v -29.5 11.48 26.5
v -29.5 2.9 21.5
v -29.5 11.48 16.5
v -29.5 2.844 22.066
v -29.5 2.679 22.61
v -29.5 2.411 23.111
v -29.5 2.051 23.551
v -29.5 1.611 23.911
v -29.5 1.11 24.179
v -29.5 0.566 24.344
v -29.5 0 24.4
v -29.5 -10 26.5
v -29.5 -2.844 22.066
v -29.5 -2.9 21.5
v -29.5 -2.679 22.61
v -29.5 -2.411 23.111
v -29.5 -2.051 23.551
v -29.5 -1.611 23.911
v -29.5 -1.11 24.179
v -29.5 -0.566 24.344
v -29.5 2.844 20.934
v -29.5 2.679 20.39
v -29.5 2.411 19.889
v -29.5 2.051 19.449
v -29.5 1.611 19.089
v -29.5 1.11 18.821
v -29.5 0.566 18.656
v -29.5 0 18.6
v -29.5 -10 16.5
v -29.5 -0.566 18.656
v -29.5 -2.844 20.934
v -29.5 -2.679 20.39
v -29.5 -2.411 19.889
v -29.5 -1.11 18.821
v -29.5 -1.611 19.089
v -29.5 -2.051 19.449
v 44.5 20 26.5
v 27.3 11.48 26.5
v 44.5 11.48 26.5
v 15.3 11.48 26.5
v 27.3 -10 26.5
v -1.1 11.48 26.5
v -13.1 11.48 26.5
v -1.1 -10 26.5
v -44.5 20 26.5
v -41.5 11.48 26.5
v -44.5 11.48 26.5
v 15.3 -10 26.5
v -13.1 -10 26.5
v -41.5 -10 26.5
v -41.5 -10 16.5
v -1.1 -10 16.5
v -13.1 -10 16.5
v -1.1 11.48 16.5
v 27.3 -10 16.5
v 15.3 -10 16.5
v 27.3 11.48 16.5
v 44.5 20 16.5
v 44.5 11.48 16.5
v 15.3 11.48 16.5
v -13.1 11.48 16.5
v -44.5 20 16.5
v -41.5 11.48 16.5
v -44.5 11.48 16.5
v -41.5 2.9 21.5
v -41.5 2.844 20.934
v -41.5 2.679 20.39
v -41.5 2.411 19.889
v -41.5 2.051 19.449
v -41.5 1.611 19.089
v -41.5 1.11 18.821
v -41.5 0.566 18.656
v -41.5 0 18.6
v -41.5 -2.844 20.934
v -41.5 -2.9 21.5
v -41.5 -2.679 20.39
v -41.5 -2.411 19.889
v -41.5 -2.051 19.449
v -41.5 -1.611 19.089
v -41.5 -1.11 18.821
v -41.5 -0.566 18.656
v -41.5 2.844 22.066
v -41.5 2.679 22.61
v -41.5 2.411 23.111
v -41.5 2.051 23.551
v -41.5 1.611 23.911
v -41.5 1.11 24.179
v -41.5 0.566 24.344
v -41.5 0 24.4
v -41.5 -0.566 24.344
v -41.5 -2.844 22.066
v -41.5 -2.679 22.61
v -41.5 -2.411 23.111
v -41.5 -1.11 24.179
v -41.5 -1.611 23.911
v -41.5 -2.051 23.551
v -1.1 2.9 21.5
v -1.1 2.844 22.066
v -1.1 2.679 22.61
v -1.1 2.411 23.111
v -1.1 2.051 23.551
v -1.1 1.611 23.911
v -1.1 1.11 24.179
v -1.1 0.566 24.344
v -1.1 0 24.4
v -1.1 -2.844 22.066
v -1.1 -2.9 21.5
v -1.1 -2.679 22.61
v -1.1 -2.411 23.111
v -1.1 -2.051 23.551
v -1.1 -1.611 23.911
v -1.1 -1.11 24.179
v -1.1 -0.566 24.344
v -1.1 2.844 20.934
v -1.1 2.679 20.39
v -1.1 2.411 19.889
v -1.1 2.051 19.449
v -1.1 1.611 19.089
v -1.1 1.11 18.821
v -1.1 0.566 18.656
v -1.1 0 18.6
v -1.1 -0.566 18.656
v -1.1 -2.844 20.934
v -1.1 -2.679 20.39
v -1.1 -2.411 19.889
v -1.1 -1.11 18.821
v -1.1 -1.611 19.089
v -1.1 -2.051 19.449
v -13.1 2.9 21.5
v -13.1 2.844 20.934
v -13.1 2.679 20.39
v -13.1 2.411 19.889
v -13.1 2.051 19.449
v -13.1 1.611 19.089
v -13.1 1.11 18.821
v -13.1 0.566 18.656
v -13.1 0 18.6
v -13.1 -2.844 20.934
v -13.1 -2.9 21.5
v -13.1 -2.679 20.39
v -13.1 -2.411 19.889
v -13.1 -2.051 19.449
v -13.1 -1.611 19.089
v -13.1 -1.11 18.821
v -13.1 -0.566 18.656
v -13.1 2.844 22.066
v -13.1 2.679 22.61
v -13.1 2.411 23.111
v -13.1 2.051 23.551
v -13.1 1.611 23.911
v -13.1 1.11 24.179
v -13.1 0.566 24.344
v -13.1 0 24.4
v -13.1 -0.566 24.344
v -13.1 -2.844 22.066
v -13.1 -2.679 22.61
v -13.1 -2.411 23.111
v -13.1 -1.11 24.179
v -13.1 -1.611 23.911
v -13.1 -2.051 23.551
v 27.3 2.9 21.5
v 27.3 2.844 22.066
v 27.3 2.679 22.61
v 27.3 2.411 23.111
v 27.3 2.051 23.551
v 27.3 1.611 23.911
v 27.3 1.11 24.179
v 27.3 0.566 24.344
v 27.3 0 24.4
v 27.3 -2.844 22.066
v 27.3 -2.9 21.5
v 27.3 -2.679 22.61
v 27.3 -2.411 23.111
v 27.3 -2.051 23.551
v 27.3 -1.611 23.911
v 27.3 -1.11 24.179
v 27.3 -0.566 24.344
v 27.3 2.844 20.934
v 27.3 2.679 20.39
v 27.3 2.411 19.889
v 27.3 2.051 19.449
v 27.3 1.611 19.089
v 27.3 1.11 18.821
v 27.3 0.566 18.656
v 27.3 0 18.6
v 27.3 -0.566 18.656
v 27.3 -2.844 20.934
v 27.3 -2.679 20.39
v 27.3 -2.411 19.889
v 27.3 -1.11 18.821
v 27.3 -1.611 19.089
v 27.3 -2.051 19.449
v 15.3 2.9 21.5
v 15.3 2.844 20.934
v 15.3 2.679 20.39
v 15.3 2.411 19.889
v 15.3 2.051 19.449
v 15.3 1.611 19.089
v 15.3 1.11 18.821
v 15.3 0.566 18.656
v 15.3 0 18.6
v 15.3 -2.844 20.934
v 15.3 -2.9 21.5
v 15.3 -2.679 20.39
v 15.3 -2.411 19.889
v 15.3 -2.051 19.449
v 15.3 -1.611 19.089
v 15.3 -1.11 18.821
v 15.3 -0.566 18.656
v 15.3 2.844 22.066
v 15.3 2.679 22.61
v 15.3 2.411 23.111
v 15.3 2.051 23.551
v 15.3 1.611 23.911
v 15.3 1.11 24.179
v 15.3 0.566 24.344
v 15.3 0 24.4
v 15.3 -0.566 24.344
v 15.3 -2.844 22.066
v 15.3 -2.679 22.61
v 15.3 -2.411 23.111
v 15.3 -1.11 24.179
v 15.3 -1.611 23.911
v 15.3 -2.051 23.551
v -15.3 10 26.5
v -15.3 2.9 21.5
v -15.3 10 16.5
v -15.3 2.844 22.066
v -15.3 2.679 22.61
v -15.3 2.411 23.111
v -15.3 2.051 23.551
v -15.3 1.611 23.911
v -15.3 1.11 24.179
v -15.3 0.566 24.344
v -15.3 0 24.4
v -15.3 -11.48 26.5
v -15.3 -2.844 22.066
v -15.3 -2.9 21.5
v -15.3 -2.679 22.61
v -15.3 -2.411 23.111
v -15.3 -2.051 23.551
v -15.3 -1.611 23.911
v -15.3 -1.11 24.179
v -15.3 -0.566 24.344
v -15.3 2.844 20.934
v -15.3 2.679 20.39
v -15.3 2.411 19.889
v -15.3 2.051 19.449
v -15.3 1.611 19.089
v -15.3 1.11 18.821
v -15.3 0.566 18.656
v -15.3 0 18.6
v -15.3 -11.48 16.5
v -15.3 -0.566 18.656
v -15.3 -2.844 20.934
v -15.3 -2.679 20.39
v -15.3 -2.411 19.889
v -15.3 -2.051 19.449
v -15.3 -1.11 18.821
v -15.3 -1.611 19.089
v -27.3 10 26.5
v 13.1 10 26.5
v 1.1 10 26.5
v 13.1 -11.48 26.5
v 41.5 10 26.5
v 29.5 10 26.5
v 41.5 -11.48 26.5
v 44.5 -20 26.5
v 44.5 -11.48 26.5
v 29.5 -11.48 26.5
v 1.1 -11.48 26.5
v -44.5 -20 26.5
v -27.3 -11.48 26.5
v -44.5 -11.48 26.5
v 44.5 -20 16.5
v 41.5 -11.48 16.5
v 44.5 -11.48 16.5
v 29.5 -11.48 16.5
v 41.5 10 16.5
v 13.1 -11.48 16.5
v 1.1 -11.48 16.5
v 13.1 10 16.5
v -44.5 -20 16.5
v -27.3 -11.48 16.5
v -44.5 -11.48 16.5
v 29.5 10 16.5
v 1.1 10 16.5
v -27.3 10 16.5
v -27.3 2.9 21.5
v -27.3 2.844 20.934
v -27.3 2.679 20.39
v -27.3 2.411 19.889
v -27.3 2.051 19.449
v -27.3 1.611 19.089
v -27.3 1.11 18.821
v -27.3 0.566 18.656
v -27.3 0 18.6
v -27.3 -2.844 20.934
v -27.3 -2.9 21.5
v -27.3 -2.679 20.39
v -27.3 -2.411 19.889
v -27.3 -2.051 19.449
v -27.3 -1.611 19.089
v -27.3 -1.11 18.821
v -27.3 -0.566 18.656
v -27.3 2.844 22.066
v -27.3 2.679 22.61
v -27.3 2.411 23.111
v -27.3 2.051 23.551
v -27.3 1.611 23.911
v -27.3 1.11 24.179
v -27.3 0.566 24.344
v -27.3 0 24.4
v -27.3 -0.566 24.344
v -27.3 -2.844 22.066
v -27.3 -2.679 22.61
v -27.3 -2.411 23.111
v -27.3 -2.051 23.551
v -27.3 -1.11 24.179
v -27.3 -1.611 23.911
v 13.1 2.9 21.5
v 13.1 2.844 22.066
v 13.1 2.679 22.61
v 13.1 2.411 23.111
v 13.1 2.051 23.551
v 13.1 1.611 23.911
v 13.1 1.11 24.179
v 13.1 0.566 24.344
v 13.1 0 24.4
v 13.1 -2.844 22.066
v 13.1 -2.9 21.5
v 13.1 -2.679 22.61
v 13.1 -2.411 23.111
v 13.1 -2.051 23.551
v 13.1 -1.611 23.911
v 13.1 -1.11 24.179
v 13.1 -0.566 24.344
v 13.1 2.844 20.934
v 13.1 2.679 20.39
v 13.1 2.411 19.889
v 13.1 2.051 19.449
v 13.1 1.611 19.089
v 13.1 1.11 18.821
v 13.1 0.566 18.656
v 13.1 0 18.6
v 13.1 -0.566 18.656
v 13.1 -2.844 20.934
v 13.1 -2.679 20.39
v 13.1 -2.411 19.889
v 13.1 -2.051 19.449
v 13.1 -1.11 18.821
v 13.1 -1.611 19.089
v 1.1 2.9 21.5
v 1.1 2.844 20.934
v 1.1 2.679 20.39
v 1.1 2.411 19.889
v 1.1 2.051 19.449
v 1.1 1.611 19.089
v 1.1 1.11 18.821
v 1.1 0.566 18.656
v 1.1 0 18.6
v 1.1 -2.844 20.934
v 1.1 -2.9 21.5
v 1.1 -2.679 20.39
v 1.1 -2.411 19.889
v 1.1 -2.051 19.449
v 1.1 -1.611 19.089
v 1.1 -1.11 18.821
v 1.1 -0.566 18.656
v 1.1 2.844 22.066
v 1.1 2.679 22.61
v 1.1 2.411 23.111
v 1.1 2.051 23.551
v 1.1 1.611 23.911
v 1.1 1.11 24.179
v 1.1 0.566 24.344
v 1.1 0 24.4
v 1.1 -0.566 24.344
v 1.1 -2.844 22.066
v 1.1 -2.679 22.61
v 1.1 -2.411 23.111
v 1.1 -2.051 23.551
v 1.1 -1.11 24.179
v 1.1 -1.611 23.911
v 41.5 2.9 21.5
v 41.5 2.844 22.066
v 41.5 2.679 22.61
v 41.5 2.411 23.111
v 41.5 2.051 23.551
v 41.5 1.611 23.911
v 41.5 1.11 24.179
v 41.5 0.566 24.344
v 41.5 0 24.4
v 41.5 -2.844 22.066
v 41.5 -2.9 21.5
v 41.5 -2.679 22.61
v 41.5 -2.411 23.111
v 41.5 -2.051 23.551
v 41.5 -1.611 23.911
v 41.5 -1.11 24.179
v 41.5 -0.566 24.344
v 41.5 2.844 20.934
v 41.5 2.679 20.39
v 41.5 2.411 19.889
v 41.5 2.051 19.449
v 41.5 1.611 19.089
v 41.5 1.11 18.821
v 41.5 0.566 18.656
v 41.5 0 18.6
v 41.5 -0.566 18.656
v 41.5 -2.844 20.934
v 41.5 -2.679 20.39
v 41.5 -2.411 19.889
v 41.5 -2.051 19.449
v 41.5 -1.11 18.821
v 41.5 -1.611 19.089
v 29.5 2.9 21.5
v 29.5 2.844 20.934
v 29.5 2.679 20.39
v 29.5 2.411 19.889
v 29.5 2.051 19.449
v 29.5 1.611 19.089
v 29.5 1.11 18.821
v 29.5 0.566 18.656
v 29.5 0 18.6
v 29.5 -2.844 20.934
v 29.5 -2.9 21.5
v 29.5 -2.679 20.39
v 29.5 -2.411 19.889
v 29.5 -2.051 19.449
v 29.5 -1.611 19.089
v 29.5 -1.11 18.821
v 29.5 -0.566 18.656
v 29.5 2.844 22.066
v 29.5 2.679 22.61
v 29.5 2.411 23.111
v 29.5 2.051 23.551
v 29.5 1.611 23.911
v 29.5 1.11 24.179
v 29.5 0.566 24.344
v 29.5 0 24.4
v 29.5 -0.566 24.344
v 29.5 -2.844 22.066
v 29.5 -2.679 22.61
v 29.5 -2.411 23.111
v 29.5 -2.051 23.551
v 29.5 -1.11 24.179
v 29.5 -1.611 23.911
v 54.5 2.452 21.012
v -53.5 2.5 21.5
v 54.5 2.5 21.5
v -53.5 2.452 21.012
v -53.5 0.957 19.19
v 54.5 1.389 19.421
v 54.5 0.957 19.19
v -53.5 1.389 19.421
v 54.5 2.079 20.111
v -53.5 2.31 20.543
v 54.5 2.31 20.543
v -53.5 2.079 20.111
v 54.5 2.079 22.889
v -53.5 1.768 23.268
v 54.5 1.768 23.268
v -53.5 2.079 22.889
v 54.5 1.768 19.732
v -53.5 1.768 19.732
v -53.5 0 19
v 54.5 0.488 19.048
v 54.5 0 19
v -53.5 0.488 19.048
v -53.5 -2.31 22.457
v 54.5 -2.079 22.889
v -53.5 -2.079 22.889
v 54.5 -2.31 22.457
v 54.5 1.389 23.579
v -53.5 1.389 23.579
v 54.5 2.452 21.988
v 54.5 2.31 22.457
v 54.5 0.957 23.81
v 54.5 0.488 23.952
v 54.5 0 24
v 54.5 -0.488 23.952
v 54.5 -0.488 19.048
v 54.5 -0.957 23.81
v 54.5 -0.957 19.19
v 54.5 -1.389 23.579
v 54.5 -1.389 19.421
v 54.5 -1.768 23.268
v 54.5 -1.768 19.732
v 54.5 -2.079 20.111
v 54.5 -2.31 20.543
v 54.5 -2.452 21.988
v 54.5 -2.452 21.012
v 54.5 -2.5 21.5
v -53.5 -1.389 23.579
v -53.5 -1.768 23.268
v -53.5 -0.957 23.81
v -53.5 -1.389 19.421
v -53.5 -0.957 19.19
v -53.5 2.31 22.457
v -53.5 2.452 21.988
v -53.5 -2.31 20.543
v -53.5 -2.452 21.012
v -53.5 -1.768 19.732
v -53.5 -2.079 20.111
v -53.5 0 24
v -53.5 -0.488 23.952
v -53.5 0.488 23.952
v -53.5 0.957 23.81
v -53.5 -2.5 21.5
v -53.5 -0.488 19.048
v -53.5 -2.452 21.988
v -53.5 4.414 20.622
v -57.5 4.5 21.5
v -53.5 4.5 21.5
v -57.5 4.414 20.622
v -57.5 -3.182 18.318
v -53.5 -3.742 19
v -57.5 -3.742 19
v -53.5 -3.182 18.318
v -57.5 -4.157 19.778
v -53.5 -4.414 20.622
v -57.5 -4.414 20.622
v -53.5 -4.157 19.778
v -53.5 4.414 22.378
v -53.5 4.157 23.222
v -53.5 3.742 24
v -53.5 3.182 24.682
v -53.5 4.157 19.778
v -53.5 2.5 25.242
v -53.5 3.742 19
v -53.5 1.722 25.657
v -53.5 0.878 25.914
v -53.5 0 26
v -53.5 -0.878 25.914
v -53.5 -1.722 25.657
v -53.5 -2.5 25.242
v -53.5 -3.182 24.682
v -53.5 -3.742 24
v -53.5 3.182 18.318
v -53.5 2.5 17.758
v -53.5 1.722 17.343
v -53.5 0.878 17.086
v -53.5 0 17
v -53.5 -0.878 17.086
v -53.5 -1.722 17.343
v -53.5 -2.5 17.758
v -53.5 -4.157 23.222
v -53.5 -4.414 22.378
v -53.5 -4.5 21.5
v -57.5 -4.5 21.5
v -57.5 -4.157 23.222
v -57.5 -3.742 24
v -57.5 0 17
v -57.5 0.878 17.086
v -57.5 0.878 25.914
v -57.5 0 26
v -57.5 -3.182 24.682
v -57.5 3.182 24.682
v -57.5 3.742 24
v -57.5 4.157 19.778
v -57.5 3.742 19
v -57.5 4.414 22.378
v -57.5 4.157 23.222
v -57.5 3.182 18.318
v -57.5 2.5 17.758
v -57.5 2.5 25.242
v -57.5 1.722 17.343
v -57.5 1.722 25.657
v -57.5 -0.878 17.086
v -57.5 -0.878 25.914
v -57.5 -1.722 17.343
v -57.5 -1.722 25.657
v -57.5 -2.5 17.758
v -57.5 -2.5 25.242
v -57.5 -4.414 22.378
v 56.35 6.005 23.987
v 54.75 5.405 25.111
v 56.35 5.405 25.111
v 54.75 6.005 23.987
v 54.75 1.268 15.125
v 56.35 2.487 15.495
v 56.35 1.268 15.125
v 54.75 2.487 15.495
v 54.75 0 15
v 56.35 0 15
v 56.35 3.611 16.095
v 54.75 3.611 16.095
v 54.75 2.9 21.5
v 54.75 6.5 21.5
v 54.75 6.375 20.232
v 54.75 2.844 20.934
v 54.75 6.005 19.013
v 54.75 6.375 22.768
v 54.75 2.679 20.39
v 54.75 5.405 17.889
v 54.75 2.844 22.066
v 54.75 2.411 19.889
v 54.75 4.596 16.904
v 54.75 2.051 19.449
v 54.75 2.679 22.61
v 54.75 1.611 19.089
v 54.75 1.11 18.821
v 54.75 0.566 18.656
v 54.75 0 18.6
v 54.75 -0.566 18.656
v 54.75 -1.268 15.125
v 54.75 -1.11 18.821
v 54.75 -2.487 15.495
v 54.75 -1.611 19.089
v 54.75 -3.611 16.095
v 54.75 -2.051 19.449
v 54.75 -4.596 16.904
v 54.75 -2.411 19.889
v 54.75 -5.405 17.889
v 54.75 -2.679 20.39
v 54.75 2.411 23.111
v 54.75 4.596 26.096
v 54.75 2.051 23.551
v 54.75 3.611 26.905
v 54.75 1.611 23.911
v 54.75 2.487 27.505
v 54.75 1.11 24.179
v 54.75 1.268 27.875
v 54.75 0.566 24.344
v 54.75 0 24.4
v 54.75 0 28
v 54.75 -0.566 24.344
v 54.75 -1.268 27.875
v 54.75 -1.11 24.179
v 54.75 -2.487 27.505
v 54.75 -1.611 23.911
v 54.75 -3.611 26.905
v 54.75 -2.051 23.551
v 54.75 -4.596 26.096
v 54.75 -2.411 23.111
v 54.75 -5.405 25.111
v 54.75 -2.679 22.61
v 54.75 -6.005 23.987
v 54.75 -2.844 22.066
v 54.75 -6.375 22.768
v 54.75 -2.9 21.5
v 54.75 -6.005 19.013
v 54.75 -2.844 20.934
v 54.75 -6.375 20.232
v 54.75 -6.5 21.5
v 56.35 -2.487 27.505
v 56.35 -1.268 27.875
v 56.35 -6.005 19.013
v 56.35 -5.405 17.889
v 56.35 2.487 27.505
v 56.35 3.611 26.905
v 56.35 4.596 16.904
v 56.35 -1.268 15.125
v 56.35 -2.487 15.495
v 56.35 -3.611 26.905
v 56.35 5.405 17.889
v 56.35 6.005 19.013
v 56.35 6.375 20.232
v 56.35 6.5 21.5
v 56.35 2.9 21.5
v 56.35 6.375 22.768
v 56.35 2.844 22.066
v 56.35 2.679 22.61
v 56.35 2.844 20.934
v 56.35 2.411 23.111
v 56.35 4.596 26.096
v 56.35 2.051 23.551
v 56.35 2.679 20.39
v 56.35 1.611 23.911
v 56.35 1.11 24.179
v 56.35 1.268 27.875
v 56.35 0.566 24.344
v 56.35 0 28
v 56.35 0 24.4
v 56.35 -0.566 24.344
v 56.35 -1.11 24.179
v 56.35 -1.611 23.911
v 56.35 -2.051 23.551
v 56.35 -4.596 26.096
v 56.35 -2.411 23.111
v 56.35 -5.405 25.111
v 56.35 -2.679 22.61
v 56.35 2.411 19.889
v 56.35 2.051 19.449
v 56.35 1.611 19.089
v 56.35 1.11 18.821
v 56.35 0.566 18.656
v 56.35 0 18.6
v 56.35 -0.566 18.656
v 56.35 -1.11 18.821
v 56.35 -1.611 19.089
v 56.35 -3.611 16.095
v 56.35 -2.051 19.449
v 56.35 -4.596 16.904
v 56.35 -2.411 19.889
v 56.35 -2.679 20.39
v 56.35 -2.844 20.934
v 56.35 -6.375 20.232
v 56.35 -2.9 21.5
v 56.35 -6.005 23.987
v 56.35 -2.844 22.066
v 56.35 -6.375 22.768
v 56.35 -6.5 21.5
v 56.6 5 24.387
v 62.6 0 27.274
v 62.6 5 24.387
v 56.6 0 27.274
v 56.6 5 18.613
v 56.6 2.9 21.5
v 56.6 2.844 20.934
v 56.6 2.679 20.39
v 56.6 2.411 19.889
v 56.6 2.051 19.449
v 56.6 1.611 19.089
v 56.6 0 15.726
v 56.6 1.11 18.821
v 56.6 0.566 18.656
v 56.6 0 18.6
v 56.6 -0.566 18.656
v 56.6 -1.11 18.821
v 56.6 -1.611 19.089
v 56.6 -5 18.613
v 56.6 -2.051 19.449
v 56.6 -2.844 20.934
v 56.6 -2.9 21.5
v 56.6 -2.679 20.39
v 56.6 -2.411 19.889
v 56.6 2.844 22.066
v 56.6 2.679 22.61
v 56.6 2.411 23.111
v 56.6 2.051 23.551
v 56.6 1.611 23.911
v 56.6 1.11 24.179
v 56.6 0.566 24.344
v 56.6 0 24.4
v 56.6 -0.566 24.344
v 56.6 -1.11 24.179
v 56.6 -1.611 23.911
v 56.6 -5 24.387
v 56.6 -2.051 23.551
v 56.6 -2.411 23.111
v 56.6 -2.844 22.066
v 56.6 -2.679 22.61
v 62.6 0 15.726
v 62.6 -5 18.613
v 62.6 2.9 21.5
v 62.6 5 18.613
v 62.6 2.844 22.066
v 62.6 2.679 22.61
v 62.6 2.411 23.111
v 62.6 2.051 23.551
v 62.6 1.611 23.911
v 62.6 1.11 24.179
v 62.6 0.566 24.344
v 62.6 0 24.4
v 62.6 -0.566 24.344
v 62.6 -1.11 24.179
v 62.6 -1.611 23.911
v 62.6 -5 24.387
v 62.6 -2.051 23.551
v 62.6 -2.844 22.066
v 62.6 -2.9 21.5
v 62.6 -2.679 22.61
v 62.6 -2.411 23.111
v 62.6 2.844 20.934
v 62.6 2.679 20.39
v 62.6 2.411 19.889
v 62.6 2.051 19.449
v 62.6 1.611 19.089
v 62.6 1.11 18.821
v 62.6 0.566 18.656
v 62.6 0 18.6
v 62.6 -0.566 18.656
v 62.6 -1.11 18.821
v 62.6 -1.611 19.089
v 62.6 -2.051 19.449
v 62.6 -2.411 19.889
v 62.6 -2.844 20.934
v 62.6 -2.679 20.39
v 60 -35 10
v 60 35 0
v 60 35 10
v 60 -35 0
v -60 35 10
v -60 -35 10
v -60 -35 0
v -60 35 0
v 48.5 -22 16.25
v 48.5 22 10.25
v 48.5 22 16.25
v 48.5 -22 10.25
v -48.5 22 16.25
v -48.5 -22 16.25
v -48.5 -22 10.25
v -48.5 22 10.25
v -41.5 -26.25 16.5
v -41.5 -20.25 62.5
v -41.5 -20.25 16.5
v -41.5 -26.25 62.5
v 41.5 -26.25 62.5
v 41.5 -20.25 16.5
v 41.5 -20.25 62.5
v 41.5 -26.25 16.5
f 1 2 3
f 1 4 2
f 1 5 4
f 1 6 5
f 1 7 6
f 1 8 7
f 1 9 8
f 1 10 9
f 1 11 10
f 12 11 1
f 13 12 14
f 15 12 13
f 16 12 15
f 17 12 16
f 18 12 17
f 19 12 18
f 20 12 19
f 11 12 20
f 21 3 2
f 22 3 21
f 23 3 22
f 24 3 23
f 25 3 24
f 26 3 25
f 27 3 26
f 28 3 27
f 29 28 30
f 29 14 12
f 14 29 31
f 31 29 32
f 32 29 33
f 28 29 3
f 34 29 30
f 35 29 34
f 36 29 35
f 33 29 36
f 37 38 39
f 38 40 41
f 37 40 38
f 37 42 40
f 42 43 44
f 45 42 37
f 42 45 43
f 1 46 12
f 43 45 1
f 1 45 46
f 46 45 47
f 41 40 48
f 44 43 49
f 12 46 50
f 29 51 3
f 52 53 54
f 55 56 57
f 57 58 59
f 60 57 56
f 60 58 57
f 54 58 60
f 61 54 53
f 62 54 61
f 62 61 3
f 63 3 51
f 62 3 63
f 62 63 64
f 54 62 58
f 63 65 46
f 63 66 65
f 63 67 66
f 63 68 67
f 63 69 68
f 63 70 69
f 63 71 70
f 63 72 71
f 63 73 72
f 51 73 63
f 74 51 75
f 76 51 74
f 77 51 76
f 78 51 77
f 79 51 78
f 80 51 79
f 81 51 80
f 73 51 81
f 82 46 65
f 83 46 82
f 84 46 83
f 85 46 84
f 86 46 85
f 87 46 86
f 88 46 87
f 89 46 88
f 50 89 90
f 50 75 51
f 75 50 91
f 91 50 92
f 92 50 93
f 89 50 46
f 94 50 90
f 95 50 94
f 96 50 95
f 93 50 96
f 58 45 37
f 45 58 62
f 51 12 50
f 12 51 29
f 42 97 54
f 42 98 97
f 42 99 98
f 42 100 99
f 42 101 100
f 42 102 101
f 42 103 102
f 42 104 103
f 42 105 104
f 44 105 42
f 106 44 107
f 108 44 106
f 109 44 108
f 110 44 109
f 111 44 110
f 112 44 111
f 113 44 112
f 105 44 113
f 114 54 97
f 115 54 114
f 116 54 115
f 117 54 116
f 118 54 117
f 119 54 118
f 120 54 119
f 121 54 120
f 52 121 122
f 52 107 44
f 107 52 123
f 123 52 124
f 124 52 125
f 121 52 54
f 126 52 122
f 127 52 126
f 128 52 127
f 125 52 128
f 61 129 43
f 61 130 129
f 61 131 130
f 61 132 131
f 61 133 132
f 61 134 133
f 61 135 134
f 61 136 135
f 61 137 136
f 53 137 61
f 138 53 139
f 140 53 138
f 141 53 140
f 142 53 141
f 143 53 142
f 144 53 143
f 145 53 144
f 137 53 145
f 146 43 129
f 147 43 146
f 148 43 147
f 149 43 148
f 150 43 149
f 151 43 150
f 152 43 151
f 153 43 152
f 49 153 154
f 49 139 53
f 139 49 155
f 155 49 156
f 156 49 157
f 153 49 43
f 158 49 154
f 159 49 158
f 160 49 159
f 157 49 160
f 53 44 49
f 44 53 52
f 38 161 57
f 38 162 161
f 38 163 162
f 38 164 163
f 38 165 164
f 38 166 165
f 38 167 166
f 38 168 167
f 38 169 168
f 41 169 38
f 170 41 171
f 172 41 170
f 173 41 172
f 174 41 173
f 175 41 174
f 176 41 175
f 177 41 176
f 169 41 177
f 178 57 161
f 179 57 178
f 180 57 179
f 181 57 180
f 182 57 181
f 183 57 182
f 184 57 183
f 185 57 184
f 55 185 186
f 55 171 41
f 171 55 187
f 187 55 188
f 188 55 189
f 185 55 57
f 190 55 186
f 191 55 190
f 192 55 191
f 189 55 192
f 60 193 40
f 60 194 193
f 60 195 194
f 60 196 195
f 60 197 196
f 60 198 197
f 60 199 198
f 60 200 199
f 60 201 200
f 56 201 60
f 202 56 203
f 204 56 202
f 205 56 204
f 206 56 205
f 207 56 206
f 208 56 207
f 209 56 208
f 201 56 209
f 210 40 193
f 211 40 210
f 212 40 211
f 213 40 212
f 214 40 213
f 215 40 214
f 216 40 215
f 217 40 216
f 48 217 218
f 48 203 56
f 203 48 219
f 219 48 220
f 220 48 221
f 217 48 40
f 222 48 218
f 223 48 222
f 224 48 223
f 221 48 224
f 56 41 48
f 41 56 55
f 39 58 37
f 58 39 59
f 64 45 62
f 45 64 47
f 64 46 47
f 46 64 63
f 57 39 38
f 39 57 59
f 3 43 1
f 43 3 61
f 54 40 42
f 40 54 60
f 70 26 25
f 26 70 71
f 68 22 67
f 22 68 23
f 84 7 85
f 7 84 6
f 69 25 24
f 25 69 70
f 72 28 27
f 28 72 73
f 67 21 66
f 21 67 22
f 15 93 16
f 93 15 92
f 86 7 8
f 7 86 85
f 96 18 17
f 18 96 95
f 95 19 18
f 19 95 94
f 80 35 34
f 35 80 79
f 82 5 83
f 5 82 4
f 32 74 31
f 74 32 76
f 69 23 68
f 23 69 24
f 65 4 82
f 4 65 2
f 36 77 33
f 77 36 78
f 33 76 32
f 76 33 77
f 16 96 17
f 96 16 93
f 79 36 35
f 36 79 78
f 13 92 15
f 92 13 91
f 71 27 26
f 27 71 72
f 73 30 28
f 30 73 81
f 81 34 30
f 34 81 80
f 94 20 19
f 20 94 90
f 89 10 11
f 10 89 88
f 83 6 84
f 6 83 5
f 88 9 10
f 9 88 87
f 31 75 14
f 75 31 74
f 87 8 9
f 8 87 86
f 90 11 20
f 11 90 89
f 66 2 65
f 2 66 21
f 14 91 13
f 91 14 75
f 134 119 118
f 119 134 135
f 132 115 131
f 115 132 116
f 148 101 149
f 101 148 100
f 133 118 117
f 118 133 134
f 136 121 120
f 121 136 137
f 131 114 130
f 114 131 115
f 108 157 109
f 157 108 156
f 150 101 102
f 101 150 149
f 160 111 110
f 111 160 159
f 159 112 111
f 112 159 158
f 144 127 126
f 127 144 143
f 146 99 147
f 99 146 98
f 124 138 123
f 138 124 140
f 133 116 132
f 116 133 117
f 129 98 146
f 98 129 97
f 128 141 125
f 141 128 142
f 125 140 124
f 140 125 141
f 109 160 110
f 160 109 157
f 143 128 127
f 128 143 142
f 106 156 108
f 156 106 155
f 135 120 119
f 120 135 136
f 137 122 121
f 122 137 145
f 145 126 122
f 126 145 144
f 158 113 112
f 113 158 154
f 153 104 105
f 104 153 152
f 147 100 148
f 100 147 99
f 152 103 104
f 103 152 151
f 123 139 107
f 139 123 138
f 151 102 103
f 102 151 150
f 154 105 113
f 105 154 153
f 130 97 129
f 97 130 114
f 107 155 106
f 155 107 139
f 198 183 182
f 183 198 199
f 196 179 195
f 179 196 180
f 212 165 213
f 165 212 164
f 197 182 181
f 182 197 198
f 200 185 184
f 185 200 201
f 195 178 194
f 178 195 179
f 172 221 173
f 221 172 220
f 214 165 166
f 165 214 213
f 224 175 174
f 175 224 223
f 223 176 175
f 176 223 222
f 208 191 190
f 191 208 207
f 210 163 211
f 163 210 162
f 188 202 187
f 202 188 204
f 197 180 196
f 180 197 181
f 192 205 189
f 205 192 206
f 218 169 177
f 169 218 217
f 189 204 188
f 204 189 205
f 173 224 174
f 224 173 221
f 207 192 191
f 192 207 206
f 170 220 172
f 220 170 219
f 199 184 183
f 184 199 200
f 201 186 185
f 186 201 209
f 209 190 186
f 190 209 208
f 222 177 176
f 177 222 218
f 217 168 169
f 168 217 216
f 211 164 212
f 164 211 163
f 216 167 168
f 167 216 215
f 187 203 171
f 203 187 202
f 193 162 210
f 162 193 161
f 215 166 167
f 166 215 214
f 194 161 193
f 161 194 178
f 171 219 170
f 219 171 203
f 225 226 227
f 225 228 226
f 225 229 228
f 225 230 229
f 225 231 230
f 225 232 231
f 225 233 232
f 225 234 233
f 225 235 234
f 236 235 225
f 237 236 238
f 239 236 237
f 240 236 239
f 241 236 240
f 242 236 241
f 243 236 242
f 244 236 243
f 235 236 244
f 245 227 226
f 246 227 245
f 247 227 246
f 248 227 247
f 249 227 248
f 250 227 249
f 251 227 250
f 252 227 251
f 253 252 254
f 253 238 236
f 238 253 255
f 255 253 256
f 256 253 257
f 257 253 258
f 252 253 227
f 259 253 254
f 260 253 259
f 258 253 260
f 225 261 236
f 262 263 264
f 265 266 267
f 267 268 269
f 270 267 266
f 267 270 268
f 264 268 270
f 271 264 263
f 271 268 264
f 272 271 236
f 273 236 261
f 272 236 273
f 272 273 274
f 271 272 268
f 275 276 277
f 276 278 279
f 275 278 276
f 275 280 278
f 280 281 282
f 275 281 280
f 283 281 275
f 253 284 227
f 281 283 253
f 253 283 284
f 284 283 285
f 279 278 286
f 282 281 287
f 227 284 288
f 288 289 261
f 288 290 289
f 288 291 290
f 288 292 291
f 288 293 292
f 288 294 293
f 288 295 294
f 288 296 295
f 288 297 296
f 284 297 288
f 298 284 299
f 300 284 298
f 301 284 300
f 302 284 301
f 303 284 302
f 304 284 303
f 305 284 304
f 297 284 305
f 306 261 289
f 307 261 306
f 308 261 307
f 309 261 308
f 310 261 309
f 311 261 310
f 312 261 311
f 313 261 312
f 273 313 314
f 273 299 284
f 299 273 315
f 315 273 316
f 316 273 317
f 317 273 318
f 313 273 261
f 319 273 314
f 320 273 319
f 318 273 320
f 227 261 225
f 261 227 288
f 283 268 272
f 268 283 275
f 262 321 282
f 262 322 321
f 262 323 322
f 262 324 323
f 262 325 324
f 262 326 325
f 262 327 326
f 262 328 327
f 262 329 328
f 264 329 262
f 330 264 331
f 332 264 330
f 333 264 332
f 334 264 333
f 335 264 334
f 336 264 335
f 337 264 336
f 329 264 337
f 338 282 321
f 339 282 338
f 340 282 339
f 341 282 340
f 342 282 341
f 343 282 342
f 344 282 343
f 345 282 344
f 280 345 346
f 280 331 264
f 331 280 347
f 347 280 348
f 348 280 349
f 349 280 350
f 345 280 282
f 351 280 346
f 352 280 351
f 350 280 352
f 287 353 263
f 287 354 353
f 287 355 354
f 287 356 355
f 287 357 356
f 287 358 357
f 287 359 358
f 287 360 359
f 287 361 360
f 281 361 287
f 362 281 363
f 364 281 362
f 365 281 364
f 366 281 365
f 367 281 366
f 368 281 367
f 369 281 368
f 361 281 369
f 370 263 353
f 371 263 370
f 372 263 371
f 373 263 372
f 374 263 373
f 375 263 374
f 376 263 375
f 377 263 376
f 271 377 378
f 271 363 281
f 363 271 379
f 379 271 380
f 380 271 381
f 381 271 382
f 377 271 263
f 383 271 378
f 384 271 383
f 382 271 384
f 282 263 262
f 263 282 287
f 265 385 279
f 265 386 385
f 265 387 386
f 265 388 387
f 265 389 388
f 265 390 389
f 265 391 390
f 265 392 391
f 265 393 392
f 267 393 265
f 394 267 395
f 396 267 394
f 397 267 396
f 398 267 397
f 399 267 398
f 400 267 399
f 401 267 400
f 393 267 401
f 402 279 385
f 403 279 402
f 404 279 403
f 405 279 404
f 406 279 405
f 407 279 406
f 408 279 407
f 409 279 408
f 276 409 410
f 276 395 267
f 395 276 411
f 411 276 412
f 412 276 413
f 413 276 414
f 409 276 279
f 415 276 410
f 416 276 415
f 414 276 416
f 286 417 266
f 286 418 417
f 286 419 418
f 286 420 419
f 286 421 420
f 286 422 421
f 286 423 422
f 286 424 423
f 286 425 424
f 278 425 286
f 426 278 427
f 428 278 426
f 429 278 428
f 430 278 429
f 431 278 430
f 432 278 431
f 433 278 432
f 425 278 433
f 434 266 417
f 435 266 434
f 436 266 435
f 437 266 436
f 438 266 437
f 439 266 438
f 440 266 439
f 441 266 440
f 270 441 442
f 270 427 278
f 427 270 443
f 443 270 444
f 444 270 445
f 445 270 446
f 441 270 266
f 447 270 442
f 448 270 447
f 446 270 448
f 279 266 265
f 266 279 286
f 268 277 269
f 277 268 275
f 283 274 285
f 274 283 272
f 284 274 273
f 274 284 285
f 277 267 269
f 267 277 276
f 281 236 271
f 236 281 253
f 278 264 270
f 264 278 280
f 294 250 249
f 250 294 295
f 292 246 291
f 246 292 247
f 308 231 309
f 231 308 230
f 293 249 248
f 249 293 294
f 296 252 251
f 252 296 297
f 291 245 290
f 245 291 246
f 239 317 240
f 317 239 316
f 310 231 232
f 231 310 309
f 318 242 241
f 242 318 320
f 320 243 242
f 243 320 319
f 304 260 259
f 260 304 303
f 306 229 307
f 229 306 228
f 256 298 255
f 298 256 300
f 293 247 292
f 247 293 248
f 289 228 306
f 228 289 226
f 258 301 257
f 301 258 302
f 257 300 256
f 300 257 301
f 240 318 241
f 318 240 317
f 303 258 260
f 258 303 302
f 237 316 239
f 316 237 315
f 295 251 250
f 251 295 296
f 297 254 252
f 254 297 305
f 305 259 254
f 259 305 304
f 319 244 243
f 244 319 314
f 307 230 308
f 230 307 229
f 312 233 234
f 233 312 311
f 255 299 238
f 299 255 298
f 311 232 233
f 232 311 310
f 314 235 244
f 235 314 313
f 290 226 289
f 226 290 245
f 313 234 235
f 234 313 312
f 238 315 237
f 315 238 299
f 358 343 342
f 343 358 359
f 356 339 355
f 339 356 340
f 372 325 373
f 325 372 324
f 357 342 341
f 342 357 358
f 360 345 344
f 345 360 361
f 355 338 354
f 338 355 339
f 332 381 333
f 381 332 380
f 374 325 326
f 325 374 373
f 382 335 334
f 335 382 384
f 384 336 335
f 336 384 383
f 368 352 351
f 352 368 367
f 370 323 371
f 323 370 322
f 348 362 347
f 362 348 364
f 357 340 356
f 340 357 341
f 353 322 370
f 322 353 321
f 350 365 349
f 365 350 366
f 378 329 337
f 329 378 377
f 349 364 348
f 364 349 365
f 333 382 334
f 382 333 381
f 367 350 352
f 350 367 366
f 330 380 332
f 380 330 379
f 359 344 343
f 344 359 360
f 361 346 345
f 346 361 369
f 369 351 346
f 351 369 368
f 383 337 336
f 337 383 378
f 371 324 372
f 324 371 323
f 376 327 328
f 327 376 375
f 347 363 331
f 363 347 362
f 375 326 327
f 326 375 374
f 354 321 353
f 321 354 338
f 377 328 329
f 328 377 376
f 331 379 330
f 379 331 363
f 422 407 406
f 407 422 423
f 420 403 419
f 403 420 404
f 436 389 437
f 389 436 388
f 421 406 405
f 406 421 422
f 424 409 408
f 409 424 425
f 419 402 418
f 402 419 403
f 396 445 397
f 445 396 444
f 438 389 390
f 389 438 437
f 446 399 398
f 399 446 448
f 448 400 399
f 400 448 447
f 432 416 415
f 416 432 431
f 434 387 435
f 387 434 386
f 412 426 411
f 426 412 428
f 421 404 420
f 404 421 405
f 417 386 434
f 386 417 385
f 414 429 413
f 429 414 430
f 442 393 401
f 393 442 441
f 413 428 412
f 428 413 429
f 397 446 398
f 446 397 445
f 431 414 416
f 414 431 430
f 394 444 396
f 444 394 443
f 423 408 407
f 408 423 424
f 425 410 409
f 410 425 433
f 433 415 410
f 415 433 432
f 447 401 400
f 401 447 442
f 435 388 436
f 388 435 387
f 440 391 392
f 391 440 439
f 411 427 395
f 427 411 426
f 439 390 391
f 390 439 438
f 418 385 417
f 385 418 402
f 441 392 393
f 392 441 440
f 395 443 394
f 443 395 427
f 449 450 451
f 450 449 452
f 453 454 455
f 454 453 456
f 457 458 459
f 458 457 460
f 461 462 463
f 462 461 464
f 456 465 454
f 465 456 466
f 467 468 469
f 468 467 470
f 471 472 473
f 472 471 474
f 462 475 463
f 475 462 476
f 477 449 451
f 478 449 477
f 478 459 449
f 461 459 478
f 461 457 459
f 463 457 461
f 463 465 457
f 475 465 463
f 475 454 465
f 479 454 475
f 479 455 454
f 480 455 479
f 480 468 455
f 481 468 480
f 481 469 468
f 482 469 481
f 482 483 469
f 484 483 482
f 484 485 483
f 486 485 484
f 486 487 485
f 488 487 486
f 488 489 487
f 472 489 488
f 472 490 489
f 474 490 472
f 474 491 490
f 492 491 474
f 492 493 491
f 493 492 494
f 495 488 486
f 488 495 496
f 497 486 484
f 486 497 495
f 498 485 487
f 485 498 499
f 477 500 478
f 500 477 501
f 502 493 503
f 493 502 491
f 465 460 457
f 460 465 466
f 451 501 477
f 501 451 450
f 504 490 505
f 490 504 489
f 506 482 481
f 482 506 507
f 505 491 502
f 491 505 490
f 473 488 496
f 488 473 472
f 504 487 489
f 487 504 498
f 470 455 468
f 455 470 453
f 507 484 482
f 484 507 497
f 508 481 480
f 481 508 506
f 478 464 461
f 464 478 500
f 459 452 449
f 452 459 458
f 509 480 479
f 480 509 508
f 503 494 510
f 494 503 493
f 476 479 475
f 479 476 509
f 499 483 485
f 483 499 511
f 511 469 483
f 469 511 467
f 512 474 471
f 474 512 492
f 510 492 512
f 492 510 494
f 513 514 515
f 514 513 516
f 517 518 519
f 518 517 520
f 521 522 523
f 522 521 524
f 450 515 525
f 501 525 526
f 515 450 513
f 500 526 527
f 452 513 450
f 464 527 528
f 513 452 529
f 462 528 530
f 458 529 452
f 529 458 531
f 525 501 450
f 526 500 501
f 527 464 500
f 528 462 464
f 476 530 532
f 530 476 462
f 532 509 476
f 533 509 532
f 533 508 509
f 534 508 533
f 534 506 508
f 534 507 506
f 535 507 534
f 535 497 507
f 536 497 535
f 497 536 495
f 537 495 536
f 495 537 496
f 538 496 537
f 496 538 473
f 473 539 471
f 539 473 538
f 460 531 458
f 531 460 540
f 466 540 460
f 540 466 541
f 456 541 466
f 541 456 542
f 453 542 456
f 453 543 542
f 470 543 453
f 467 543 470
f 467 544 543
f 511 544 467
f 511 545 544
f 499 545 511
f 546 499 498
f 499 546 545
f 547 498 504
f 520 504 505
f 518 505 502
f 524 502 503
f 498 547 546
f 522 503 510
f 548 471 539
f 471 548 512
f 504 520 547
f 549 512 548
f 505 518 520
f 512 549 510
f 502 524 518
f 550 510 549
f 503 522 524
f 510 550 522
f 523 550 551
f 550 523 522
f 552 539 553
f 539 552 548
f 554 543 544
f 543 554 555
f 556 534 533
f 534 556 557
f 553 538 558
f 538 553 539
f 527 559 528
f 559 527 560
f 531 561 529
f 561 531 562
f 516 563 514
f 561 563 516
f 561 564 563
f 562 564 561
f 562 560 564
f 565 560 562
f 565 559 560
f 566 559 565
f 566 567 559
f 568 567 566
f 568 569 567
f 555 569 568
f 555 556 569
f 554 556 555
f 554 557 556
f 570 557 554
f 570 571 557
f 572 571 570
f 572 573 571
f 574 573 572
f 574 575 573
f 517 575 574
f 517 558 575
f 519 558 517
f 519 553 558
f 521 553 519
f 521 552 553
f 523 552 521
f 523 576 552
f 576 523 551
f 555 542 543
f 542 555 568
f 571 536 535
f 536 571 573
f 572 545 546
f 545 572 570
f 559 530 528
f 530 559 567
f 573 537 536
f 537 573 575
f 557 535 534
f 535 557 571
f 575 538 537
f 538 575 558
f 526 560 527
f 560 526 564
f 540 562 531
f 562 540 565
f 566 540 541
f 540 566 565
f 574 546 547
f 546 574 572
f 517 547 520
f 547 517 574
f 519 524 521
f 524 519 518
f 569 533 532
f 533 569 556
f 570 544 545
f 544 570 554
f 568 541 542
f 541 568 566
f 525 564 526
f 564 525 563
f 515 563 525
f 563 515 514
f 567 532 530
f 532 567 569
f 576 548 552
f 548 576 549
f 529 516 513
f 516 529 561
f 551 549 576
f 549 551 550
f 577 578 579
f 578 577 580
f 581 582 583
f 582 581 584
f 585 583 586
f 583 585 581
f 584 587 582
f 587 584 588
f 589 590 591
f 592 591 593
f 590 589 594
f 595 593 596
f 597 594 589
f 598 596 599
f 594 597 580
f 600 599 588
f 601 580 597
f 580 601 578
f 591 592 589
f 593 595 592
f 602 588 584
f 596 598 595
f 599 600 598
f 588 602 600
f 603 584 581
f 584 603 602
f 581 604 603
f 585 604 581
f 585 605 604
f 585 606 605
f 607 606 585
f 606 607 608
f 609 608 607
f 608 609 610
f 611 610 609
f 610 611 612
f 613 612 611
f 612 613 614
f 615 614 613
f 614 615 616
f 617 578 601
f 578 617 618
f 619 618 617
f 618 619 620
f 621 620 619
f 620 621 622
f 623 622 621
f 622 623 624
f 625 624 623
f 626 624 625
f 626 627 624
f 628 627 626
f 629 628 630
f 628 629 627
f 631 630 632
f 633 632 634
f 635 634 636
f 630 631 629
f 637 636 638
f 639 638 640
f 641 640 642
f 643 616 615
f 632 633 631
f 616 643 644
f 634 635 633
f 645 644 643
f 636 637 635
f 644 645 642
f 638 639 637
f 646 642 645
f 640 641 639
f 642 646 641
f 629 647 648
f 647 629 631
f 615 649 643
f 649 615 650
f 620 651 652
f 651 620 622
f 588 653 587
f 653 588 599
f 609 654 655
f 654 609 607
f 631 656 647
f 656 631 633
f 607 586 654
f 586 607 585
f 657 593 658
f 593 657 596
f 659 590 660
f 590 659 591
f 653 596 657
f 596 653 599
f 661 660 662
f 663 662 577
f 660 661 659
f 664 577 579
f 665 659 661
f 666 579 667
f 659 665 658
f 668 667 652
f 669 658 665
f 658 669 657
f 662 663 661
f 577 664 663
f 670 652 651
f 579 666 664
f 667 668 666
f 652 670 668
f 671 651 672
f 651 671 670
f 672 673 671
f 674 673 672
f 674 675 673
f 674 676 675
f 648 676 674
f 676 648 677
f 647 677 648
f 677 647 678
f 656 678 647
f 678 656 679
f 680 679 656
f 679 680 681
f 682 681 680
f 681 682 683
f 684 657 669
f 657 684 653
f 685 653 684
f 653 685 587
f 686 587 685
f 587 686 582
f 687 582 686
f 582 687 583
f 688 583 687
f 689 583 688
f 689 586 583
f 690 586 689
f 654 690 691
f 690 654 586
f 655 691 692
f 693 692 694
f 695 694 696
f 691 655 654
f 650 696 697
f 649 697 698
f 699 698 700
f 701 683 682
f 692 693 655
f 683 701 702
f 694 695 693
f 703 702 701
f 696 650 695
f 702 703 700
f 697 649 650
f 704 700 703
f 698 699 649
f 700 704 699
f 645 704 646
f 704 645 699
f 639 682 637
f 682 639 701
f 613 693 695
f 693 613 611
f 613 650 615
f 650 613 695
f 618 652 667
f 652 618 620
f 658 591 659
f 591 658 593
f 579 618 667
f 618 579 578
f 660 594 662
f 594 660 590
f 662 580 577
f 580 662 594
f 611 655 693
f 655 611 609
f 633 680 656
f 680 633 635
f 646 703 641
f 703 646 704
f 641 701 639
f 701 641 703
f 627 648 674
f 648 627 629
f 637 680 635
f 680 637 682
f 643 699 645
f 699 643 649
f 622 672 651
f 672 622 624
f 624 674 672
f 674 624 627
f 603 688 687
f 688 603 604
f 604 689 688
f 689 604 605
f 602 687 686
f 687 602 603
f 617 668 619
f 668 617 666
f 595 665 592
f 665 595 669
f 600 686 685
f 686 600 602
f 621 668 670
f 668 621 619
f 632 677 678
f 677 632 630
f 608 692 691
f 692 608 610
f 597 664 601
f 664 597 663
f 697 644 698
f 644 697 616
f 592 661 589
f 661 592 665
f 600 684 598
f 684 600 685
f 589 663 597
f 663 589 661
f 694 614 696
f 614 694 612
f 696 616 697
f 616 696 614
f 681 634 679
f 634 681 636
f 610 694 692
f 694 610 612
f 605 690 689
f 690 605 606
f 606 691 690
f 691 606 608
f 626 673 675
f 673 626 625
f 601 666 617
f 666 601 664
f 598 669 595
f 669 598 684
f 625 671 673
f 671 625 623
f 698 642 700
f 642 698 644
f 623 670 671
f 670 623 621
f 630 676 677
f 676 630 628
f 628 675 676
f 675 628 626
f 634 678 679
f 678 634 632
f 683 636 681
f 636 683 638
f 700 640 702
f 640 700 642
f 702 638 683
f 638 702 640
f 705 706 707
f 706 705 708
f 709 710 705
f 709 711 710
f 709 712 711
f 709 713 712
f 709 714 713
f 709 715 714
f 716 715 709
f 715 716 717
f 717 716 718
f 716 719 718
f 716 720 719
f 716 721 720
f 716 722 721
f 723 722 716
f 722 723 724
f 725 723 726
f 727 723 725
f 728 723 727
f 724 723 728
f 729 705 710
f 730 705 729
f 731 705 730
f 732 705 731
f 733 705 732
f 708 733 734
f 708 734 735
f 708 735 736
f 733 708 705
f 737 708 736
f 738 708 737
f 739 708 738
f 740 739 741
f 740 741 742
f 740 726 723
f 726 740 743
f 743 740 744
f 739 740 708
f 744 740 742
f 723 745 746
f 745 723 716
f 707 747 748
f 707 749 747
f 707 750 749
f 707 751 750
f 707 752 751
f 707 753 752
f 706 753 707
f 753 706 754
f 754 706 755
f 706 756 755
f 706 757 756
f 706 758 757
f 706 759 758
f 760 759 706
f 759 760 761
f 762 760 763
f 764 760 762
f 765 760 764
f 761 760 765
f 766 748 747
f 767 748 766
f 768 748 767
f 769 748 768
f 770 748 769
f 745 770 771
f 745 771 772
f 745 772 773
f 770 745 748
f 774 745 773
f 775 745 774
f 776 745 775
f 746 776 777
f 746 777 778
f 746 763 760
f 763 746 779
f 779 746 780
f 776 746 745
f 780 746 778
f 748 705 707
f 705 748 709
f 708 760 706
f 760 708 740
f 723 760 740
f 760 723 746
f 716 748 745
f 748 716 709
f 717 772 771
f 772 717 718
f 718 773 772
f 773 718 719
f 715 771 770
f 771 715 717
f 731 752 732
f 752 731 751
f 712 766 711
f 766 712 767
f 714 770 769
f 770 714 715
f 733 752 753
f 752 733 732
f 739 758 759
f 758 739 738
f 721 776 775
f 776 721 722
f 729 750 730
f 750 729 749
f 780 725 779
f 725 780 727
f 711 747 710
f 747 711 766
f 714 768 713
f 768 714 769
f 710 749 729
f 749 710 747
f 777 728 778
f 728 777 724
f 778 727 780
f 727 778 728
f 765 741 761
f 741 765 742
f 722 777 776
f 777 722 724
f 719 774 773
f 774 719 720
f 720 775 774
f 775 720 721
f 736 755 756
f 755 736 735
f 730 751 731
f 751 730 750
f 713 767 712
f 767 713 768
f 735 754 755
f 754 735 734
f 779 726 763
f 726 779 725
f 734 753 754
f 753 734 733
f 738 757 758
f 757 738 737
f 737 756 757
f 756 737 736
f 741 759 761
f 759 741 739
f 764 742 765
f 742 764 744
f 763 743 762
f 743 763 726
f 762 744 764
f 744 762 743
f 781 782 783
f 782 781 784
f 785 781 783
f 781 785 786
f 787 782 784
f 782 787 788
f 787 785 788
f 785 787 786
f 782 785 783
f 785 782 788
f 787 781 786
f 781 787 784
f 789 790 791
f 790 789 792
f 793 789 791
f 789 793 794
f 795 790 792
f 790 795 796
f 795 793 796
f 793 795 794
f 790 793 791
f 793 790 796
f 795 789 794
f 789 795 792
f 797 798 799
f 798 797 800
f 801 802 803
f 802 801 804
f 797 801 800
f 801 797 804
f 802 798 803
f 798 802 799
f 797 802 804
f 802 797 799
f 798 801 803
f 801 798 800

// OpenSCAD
$fn = 32;

// ------------------------------------------------------------------------
// Comb hinge with flap: leaf 89 x 20 mm, pin d5, flap 46 mm
// Every part is its own module, assembly() places every instance.
// ------------------------------------------------------------------------

// --- part 1 ---
module hinge_bed() {
  difference() {
    translate([-60, -35, 0]) cube([120, 70, 10]);
  }
}

// --- part 2 ---
module hinge_riser() {
  difference() {
    translate([-48.5, -22, 0]) cube([97, 44, 6]);
  }
}

// --- part 3 ---
module hinge_leaf_a() {
  difference() {
    union() {
      translate([-41.5, -10, -5]) cube([12, 30, 10]);
      translate([-13.1, -10, -5]) cube([12, 30, 10]);
      translate([15.3, -10, -5]) cube([12, 30, 10]);
      translate([-44.5, 11.48, -5]) cube([89, 8.52, 10]);
    }
    translate([-35.5, 0, 0]) rotate([0, 90, 0]) cylinder(h = 14, d = 5.8, center = true);
    translate([-7.1, 0, 0]) rotate([0, 90, 0]) cylinder(h = 14, d = 5.8, center = true);
    translate([21.3, 0, 0]) rotate([0, 90, 0]) cylinder(h = 14, d = 5.8, center = true);
  }
}

// --- part 4 ---
module hinge_leaf_b() {
  difference() {
    union() {
      translate([-27.3, -20, -5]) cube([12, 30, 10]);
      translate([1.1, -20, -5]) cube([12, 30, 10]);
      translate([29.5, -20, -5]) cube([12, 30, 10]);
      translate([-44.5, -20, -5]) cube([89, 8.52, 10]);
    }
    translate([-21.3, 0, 0]) rotate([0, 90, 0]) cylinder(h = 14, d = 5.8, center = true);
    translate([7.1, 0, 0]) rotate([0, 90, 0]) cylinder(h = 14, d = 5.8, center = true);
    translate([35.5, 0, 0]) rotate([0, 90, 0]) cylinder(h = 14, d = 5.8, center = true);
  }
}

// --- part 5 ---
module hinge_flap() {
  difference() {
    translate([-41.5, -23, 0]) cube([83, 46, 6]);
  }
}

// --- part 6 ---
module hinge_pin() {
  rotate([0, 90, 0]) cylinder(h = 109, d = 5, center = true);
  translate([-57.5, 0, 0]) rotate([0, 90, 0]) cylinder(h = 4, d = 9);
}

// --- part 7 ---
module pin_washer() {
  difference() {
      translate([0, 0, 0]) cylinder(h = 1.6, d = 13);
      translate([0, 0, -1]) cylinder(h = 3.6, d = 5.8);
    }
}

// --- part 8 ---
module pin_nut() {
  difference() {
    linear_extrude(height = 6) polygon(points = [[5.774, 0], [2.887, 5], [-2.887, 5], [-5.774, 0], [-2.887, -5], [2.887, -5]]);
    translate([0, 0, -1]) cylinder(h = 8, d = 5.8);
  }
}

// --- assembly ---
module assembly() {
  color([0.80, 0.24, 0.20]) translate([0, 0, 0]) rotate([0, 0, 0]) hinge_bed();
  color([0.20, 0.45, 0.75]) translate([0, 0, 10.25]) rotate([0, 0, 0]) hinge_riser();
  color([0.25, 0.62, 0.32]) translate([0, 0, 21.5]) rotate([0, 0, 0]) hinge_leaf_a();
  color([0.92, 0.70, 0.18]) translate([0, 0, 21.5]) rotate([0, 0, 0]) hinge_leaf_b();
  color([0.58, 0.35, 0.70]) translate([0, -20.25, 39.5]) rotate([90, 0, 0]) hinge_flap();
  color([0.16, 0.66, 0.66]) translate([0, 0, 21.5]) rotate([0, 0, 0]) hinge_pin();
  color([0.85, 0.48, 0.18]) translate([54.75, 0, 21.5]) rotate([0, 90, 0]) pin_washer();
  color([0.55, 0.60, 0.65]) translate([56.6, 0, 21.5]) rotate([0, 90, 0]) pin_nut();
}

assembly();
